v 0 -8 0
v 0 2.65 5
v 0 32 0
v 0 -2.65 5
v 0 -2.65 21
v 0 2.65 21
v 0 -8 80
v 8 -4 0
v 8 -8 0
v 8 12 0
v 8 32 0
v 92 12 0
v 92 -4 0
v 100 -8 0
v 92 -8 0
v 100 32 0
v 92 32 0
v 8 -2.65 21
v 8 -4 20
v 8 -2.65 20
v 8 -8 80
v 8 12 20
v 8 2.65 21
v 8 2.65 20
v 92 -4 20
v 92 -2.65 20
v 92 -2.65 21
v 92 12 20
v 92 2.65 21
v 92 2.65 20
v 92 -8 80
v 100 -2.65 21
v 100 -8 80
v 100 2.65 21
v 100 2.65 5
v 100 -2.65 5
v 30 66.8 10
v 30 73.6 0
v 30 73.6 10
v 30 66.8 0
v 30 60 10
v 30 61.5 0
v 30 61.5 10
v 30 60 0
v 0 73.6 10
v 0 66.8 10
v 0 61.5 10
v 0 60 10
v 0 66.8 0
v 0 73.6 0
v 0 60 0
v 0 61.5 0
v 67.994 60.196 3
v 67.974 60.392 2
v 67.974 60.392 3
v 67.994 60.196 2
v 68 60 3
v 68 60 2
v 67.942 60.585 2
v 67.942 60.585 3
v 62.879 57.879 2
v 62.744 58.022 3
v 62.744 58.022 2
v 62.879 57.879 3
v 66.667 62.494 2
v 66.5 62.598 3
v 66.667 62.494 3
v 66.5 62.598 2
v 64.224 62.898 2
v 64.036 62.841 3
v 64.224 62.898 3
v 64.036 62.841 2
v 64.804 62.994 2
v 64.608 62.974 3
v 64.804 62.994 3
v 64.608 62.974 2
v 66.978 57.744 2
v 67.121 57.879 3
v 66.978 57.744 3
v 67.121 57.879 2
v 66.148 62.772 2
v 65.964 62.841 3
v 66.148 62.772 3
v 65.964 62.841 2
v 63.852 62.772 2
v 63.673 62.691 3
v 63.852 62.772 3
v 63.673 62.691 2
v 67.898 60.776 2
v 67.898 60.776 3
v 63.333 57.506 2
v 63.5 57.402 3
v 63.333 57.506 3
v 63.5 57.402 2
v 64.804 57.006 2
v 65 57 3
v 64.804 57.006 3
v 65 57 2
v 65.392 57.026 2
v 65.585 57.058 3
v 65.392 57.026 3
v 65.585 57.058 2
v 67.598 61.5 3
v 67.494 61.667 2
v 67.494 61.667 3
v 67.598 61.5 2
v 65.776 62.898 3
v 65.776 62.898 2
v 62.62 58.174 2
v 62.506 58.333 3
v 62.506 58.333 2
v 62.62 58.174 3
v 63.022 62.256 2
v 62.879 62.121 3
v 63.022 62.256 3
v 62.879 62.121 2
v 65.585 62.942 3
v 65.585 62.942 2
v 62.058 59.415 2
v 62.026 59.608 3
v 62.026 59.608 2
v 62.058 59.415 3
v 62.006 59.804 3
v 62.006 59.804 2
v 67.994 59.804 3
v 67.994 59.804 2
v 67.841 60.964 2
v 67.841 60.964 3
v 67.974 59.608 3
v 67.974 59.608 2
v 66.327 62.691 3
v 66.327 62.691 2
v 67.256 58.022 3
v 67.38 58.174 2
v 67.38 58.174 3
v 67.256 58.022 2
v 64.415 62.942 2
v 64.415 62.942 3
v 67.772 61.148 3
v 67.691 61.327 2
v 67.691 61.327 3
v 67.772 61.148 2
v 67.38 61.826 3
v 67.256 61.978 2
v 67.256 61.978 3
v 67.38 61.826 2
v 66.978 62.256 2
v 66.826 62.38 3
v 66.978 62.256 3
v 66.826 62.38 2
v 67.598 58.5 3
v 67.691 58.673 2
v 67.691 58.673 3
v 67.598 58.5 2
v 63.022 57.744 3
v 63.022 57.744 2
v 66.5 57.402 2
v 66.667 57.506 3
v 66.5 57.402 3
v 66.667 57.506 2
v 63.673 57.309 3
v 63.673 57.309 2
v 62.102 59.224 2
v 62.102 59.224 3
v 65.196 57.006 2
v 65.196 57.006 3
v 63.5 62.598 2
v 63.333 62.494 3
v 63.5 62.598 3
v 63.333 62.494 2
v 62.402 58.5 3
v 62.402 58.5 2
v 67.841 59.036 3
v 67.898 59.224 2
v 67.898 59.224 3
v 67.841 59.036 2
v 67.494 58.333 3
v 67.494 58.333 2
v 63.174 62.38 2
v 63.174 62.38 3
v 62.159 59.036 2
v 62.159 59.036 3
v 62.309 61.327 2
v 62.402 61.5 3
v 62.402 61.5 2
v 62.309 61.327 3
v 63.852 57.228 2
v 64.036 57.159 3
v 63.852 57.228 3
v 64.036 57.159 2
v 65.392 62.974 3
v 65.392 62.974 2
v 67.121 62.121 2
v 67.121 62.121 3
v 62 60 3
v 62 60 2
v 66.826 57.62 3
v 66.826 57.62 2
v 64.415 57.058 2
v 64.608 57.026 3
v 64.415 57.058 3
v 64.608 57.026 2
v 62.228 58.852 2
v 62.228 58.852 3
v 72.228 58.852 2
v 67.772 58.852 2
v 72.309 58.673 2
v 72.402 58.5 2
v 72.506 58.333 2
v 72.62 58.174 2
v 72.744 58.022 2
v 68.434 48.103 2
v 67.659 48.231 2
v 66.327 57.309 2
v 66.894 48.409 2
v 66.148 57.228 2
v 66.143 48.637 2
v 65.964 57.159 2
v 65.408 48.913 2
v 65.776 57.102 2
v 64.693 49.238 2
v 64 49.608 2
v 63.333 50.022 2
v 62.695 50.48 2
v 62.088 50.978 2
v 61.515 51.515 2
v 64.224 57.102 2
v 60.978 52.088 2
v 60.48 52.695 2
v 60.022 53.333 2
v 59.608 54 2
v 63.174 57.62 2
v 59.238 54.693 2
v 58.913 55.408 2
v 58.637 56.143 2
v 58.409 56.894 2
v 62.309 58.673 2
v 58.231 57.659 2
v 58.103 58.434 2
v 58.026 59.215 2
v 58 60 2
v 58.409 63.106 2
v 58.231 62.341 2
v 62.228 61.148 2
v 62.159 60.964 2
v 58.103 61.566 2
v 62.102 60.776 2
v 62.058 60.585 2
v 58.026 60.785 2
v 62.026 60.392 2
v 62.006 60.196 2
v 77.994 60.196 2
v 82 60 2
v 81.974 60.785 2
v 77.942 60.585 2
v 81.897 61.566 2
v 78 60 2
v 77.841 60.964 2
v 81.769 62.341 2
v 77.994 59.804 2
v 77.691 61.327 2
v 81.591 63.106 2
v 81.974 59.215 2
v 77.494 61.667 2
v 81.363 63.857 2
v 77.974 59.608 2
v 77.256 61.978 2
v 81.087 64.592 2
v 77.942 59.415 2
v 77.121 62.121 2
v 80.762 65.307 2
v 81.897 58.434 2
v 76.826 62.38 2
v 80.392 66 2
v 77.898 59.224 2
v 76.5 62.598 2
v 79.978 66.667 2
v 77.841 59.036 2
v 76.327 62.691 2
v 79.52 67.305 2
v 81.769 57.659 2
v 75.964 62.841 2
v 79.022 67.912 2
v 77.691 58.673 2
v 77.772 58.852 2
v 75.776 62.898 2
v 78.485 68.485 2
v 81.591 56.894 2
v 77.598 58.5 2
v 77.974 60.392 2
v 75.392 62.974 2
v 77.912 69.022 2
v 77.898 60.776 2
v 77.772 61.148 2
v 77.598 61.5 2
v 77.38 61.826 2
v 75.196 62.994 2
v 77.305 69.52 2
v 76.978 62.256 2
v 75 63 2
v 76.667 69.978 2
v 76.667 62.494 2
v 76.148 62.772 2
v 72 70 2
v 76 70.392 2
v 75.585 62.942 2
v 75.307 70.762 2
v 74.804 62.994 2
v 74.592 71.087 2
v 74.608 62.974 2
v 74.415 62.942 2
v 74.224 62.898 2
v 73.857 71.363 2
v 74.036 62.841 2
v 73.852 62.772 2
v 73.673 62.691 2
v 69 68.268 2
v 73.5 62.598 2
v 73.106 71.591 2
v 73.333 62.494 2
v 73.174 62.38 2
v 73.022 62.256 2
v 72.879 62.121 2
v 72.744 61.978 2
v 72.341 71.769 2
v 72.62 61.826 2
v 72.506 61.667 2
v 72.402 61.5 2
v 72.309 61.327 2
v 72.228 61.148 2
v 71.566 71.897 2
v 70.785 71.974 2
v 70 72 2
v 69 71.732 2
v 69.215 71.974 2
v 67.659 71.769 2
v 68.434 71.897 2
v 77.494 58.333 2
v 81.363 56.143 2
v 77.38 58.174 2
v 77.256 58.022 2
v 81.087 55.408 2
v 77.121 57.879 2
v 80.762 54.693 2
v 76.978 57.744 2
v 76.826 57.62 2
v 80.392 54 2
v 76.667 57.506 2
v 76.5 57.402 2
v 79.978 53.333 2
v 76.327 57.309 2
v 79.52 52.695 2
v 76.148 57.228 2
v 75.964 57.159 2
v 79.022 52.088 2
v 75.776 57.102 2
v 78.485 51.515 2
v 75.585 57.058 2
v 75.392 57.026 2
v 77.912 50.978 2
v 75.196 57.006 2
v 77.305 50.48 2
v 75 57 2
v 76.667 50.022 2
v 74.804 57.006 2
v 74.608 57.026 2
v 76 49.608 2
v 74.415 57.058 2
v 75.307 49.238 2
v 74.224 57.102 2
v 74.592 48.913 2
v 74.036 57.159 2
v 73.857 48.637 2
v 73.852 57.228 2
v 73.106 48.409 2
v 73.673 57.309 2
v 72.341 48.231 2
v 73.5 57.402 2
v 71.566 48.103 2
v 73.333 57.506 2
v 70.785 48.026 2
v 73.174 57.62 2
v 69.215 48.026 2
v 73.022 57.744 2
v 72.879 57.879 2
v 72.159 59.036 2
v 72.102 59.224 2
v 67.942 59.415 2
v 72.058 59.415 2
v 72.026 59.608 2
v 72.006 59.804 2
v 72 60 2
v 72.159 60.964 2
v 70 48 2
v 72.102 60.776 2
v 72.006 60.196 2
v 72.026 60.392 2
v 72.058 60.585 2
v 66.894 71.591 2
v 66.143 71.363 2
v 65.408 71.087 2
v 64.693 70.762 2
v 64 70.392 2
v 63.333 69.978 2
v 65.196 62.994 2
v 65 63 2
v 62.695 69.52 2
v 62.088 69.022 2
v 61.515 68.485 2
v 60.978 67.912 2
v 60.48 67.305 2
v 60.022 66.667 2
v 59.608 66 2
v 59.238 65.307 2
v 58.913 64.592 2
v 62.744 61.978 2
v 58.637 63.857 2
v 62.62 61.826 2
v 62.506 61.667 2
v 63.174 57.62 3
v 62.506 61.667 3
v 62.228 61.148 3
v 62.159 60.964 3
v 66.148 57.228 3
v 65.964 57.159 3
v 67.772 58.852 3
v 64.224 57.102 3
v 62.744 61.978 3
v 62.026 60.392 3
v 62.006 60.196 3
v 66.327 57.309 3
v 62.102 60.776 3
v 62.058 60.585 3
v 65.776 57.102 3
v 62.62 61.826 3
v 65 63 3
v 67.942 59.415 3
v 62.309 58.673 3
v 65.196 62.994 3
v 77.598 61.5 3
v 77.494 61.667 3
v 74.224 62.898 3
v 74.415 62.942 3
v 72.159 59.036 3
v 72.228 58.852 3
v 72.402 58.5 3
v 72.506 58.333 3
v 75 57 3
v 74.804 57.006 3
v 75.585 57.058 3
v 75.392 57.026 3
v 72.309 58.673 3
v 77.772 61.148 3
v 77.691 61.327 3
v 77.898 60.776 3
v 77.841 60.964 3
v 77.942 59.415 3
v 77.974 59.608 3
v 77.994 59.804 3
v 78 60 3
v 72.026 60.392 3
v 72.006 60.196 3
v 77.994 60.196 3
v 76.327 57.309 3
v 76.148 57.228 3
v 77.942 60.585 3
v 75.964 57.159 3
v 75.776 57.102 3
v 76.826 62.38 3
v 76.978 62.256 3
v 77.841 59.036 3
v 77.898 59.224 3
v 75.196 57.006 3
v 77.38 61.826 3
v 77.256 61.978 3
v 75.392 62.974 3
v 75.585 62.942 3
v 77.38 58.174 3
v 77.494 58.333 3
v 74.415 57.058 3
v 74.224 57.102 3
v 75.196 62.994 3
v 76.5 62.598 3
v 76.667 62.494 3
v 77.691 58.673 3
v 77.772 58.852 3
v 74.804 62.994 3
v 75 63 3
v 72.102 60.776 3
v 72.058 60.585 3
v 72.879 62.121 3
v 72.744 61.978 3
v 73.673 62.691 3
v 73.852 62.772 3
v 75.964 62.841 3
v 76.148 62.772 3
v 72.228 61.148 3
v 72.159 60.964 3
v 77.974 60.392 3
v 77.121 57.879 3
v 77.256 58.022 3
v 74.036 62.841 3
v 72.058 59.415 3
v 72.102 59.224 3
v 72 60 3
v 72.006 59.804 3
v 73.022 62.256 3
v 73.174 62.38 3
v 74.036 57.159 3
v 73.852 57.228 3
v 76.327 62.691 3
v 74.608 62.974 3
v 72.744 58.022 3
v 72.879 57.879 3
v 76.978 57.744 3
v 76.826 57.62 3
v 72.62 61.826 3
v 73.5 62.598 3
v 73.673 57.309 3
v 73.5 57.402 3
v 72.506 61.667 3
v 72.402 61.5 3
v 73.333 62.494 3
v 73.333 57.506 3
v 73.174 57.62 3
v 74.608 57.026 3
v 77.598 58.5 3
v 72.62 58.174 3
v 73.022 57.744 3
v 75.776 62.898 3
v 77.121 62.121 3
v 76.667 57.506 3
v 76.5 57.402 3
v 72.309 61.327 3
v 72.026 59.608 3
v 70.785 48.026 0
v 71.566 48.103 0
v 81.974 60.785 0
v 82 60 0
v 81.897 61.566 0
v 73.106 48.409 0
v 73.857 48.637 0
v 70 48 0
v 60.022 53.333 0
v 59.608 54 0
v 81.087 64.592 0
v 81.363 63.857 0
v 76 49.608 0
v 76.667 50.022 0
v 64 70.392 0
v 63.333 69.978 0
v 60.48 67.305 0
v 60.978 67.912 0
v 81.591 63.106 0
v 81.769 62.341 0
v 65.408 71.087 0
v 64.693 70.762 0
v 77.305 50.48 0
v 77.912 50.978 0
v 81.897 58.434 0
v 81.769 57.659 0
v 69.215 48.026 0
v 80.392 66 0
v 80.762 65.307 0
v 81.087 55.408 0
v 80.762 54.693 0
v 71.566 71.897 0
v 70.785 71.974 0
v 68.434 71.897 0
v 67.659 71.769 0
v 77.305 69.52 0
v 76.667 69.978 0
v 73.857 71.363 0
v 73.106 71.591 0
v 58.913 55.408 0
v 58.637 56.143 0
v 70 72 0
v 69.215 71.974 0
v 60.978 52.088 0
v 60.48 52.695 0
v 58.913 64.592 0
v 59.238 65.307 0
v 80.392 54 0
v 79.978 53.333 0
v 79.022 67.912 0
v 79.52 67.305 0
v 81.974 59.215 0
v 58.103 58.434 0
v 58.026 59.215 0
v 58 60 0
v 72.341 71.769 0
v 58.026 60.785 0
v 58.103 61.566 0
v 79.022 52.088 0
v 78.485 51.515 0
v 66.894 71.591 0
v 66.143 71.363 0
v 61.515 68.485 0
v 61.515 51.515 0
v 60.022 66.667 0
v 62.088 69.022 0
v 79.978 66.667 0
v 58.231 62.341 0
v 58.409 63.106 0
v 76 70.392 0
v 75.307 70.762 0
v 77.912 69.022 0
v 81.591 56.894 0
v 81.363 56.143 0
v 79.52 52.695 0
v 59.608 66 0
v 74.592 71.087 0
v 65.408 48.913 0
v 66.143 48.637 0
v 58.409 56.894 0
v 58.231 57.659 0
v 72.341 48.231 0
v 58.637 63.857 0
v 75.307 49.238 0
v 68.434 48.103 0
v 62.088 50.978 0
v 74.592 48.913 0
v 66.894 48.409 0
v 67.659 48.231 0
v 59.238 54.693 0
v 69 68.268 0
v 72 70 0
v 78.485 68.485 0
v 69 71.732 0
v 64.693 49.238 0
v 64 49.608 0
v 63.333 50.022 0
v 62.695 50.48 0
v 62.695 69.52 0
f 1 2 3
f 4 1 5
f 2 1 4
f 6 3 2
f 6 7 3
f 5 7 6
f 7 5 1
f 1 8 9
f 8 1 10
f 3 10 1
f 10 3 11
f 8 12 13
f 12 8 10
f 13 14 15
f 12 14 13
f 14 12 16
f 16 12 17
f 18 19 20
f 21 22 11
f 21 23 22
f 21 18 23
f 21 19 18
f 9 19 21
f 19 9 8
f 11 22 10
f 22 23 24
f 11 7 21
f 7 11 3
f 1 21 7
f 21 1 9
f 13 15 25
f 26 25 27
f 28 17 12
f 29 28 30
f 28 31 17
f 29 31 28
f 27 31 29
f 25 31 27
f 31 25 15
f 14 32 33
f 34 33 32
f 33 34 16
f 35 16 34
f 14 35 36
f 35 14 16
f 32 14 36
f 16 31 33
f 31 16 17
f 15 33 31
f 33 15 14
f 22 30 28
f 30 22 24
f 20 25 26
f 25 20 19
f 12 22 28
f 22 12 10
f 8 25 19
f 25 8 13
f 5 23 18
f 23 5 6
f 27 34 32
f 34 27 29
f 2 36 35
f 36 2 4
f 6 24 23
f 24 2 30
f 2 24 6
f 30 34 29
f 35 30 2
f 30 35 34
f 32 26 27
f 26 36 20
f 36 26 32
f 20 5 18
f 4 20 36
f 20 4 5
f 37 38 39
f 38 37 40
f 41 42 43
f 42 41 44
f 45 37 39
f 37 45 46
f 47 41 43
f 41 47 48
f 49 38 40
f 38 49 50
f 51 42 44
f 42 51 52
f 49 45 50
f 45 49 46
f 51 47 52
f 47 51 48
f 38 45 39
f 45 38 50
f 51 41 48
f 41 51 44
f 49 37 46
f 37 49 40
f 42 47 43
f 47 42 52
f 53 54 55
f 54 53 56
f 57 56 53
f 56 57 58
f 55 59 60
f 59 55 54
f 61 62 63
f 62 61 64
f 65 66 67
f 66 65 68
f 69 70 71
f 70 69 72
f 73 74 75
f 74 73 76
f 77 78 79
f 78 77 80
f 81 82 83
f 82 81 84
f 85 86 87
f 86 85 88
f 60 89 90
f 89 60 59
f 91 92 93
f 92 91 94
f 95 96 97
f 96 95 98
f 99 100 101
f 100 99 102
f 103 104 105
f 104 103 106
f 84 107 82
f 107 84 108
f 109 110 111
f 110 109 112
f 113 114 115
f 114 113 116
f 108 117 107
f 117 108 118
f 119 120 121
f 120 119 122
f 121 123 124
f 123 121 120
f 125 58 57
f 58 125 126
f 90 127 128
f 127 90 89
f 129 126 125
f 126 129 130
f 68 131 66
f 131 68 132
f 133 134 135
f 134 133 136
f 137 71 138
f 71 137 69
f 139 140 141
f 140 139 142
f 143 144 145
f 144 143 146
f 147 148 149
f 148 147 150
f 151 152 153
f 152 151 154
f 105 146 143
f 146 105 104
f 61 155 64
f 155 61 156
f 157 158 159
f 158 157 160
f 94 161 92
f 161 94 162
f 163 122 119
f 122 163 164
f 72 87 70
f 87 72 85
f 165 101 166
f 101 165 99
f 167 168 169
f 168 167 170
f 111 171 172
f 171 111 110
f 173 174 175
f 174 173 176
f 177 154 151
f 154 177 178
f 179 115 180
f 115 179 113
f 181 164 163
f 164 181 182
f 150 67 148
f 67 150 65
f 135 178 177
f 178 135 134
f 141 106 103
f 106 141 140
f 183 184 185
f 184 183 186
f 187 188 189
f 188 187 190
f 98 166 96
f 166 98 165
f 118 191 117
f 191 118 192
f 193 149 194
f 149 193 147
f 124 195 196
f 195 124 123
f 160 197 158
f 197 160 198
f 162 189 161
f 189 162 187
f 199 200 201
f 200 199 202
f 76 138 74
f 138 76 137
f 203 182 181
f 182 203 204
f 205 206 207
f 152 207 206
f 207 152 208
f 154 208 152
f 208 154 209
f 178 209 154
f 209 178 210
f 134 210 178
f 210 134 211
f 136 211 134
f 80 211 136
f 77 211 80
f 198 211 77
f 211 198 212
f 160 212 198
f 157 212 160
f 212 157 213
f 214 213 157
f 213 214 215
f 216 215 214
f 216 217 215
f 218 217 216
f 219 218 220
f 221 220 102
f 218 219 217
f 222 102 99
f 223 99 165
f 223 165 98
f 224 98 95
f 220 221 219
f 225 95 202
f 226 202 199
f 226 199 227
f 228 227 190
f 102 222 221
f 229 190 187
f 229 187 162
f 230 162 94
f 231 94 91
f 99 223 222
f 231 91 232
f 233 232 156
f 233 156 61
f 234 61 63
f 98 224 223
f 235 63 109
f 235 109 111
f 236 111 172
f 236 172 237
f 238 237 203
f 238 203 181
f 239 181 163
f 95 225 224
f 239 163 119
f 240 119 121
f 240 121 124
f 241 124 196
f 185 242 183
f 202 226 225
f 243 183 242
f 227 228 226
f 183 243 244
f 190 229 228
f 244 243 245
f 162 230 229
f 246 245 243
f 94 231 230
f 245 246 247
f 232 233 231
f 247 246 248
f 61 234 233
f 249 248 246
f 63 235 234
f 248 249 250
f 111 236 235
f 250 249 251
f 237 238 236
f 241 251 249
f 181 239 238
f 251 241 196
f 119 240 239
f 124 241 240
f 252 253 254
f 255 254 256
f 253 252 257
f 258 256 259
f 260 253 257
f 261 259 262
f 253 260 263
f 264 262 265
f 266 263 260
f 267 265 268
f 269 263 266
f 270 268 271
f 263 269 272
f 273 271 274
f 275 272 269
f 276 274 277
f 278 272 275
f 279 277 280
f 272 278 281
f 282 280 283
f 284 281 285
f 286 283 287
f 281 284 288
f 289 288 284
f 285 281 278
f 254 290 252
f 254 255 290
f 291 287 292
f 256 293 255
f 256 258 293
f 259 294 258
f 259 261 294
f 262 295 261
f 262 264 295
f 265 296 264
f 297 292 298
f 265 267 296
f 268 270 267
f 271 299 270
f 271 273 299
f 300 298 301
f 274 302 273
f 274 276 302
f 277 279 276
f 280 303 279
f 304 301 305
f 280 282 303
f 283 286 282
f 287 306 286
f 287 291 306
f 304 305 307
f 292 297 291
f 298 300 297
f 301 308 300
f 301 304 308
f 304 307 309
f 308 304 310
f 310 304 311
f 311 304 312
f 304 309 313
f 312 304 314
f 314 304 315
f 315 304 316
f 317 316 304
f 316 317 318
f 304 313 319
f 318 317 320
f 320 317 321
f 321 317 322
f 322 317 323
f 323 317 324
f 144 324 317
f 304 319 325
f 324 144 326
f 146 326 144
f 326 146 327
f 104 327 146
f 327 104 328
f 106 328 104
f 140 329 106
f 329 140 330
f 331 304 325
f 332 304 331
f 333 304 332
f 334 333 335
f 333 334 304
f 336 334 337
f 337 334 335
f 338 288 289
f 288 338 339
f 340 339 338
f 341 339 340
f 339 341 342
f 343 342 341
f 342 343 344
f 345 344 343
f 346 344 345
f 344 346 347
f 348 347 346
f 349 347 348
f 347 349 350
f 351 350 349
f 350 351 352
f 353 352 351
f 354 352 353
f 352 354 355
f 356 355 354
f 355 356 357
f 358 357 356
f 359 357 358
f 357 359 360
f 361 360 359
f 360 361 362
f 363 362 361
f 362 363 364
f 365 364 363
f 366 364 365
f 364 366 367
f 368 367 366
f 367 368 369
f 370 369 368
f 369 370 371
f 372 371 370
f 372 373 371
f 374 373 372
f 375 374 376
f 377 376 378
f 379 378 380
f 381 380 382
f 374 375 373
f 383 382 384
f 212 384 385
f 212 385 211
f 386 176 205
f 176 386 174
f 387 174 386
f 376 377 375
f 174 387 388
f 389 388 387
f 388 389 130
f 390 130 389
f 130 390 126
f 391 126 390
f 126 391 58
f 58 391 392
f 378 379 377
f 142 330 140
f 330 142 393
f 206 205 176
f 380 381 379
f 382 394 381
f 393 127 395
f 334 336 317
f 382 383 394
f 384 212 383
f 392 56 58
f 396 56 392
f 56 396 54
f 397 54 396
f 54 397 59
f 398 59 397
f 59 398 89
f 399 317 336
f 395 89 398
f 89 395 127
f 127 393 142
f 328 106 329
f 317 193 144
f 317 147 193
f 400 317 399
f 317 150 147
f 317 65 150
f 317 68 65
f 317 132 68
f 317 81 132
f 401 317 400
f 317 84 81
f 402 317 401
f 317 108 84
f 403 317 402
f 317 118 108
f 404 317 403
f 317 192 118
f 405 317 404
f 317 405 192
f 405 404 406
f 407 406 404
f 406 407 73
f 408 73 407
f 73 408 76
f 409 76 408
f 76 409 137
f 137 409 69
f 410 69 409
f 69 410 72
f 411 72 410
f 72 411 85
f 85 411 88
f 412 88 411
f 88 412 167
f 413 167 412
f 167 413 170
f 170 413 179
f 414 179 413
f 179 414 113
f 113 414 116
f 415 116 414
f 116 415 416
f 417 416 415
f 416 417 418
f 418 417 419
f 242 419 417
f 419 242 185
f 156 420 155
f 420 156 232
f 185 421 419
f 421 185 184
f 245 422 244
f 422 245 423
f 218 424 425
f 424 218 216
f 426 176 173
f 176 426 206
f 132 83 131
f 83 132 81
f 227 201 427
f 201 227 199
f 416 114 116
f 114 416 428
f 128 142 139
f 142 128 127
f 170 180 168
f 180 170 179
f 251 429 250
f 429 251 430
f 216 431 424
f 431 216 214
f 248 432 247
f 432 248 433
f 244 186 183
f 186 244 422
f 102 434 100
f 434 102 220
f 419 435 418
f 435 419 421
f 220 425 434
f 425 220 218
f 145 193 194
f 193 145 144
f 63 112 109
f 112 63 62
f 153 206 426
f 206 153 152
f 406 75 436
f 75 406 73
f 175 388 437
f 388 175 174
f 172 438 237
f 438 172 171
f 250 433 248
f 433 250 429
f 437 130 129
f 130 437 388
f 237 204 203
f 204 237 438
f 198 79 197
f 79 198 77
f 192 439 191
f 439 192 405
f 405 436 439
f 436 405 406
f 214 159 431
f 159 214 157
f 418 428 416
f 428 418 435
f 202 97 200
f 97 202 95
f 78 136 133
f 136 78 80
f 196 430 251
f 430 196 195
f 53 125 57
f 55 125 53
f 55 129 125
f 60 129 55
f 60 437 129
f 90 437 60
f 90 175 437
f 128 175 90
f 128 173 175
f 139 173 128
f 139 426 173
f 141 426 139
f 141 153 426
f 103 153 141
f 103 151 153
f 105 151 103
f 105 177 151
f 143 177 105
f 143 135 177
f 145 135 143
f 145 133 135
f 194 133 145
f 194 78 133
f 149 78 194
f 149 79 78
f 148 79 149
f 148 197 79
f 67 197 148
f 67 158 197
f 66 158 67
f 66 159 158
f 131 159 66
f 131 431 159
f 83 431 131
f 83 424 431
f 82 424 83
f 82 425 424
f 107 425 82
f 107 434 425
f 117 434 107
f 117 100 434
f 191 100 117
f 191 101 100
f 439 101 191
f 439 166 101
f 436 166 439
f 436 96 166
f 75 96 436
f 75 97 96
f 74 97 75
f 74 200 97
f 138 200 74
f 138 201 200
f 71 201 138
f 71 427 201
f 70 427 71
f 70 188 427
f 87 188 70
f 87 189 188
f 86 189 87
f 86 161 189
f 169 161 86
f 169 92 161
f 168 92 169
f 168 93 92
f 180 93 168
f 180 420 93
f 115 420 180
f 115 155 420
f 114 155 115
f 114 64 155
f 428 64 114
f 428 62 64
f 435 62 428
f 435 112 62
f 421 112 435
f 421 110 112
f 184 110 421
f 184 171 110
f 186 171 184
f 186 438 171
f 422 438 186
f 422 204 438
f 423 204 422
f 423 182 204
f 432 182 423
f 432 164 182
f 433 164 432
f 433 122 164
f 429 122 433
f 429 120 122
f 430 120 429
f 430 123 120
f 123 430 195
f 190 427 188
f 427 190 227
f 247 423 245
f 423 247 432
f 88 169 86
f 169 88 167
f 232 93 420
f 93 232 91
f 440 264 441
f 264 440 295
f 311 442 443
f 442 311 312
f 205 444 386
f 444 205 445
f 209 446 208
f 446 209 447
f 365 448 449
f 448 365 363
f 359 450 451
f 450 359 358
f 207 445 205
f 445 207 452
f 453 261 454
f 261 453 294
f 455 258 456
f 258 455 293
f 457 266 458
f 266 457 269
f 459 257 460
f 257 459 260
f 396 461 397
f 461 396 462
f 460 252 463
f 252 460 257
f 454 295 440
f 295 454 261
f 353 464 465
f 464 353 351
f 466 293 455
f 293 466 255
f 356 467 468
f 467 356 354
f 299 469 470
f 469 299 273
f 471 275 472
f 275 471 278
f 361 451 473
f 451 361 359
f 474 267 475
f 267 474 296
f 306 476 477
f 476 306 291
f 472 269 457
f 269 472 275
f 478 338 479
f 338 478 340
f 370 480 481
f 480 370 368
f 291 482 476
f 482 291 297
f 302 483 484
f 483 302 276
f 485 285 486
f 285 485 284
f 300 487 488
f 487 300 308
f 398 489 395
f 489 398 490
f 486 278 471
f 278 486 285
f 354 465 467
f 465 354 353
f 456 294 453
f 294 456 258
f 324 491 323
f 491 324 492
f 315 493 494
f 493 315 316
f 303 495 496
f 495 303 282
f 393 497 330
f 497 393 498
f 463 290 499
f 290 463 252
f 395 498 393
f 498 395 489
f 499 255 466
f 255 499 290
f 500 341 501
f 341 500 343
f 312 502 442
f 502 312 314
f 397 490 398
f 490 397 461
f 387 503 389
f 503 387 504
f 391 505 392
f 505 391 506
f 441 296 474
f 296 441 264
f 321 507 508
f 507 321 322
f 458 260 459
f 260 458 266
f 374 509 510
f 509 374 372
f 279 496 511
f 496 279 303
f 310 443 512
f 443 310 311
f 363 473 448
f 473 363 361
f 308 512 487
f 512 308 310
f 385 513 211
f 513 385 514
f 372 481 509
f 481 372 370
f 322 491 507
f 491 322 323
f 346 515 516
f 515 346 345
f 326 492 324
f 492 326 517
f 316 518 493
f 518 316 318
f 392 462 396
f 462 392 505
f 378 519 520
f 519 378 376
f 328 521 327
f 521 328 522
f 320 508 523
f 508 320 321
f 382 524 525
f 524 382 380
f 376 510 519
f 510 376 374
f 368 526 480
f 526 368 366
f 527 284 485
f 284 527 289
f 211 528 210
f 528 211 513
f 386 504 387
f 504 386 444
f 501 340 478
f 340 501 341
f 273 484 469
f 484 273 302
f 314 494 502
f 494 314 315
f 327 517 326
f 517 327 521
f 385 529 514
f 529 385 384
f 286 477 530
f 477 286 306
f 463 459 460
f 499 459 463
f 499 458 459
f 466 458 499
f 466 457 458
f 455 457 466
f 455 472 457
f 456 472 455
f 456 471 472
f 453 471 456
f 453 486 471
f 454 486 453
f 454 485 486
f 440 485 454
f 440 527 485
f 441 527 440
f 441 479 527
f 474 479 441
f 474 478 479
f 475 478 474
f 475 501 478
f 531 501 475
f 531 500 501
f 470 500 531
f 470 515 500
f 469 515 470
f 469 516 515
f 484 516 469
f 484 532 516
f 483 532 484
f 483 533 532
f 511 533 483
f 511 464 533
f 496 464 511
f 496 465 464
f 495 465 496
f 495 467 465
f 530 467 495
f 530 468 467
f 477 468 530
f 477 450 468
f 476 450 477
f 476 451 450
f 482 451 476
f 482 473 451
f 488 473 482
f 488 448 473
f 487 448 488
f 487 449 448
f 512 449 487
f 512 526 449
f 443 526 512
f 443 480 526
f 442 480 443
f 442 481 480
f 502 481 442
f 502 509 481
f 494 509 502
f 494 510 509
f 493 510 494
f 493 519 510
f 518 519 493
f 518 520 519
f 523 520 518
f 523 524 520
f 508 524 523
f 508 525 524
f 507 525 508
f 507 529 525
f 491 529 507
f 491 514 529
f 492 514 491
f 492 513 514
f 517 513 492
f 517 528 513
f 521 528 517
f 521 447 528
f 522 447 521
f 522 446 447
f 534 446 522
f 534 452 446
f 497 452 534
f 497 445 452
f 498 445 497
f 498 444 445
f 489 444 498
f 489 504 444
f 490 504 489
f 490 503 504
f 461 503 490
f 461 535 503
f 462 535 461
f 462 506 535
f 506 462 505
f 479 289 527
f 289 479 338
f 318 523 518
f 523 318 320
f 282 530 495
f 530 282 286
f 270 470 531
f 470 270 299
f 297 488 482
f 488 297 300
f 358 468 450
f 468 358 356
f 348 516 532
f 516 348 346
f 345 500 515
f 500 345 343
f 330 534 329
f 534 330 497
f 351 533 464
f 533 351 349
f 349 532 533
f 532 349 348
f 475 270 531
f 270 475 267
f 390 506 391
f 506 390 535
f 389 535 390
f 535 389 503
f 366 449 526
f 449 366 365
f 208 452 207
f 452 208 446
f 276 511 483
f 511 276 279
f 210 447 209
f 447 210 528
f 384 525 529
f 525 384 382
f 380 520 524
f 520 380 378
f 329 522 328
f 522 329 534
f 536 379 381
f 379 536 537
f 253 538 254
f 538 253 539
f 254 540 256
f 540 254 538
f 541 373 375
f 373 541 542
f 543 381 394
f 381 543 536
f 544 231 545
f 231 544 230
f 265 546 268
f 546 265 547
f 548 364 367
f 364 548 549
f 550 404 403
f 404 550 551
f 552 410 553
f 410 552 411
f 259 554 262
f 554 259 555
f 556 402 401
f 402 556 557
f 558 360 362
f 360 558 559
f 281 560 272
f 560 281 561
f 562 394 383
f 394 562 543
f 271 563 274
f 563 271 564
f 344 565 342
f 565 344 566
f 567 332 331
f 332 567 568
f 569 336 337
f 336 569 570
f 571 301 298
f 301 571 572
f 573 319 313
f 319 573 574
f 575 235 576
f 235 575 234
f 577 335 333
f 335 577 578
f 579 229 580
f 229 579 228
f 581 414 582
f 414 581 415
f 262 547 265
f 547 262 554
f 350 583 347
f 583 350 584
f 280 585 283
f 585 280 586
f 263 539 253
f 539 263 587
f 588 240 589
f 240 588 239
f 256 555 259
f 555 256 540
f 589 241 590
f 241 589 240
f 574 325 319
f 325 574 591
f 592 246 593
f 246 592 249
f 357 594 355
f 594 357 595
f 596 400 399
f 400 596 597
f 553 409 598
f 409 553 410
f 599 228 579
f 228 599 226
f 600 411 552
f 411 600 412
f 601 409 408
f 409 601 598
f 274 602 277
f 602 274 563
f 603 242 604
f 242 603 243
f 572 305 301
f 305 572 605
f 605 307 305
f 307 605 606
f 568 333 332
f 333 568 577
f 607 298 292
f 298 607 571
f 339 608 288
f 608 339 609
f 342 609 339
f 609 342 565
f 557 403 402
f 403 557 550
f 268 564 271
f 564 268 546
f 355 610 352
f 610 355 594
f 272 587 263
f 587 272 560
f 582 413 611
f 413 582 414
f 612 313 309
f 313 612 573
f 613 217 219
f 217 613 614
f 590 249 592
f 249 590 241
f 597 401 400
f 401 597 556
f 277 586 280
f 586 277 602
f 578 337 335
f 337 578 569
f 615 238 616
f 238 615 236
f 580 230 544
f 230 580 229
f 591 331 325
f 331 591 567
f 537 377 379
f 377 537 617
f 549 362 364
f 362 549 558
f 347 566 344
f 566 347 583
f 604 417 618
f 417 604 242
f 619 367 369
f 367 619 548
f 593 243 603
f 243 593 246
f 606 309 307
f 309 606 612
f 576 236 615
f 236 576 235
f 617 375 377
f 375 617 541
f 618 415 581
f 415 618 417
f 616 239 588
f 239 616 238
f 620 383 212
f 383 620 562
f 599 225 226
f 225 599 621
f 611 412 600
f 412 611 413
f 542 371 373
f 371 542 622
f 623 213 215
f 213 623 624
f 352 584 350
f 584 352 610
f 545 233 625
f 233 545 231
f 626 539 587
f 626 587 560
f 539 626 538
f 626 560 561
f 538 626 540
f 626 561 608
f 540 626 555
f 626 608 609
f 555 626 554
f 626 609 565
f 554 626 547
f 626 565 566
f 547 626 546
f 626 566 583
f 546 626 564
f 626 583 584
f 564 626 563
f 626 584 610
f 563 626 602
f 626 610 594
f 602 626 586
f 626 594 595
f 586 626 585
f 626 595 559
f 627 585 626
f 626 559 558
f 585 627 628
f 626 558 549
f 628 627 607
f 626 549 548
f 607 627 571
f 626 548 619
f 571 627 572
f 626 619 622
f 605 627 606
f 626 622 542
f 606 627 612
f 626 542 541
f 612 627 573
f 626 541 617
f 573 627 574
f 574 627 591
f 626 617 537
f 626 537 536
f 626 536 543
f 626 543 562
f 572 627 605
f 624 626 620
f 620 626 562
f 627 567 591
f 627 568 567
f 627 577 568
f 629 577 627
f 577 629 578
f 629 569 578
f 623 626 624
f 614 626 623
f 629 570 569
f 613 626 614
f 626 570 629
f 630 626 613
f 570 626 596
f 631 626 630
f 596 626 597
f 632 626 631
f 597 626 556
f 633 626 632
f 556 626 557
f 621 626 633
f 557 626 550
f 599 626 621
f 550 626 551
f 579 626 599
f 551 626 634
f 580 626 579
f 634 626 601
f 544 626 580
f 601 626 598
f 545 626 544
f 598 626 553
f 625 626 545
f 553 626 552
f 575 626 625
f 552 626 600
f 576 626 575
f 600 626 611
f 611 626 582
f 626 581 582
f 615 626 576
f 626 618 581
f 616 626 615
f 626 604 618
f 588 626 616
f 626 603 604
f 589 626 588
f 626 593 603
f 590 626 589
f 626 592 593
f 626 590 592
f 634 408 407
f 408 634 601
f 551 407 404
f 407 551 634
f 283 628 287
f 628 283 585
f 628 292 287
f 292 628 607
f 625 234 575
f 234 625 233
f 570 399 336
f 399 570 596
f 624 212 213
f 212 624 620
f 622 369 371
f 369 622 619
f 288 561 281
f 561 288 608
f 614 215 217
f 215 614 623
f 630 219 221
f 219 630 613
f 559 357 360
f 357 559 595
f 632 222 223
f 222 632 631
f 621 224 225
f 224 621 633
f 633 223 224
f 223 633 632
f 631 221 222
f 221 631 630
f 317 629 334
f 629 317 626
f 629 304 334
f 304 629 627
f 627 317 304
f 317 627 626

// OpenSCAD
// file: ../lib/dovetail.scad
// lib/dovetail.scad
// Shared joinery modules: dovetail tenon/mortise, M3 insert boss, rounded box.
// Depends on values in params.scad (include it in the calling file).

// A dovetail tenon: a flared prism that grows wider toward its tip so it locks
// against a matching mortise when slid in along +y.
//   len   : protrusion length (along +y)
//   base_w: width at the root (x, near the part)
//   tip_w : width at the tip (x, wider -> self locking)
//   h     : height (z)
// Literal defaults keep this library self-contained under `use <>` (which does
// not import the caller's params). Callers pass explicit sizes where needed.
module dovetail_tenon(len = 8, base_w = 8, tip_w = 12, h = 10) {
    linear_extrude(height = h)
        polygon(points = [
            [-base_w/2, 0],
            [ base_w/2, 0],
            [ tip_w/2,  len],
            [-tip_w/2,  len],
        ]);
}

// Matching mortise volume (subtract this). Enlarged by tol_dovetail per side.
module dovetail_mortise(len = 8, base_w = 8, tip_w = 12, h = 10, clr = 0.15) {
    // extend slightly beyond both faces so the cut is clean
    translate([0, -0.01, -0.01])
        linear_extrude(height = h + 0.02)
            polygon(points = [
                [-(base_w/2 + clr), 0],
                [ (base_w/2 + clr), 0],
                [ (tip_w/2 + clr),  len + 0.02],
                [-(tip_w/2 + clr),  len + 0.02],
            ]);
}

// Cylindrical boss with a blind hole for a heat-set insert.
//   boss_d : outer diameter of the boss
//   boss_h : height
//   hole_d : insert press-hole diameter (params: m3_insert)
//   hole_depth : blind hole depth (0 = through)
module insert_boss(boss_d = 8, boss_h = 8, hole_d = 4.0, hole_depth = 0) {
    difference() {
        cylinder(d = boss_d, h = boss_h);
        translate([0, 0, hole_depth == 0 ? -0.01 : boss_h - hole_depth])
            cylinder(d = hole_d, h = hole_depth == 0 ? boss_h + 0.02 : hole_depth + 0.01);
    }
}

// Rounded rectangular box shell (open top) used by gondola / recesses.
module rounded_box(x, y, z, r = 2) {
    hull() {
        for (sx = [-1, 1], sy = [-1, 1])
            translate([sx * (x/2 - r), sy * (y/2 - r), 0])
                cylinder(r = r, h = z);
    }
}

// A simple rectangular slot cutter (for tabs), centered on x, open along z.
module slot(w, t, d) {
    translate([-w/2, -t/2, -0.01])
        cube([w, t, d + 0.02]);
}
// main file
// booth/stand_clips.scad
// Wall-panel stand (100 x 80, t8) + panel connecting clip + position marker,
// laid out for a single print.
//   stand  : a channel foot the panel bottom edge drops into, braced by two
//            triangular end gussets (support-free: slot opens upward).
//   clip   : H-section clip that joins two panel edges side by side.
//   marker : Ø24 floor disc marking Stack-chan's photo spot (raised footprint).

include <../params.scad>;
use <../lib/dovetail.scad>;

rail_h   = 20;               // channel rail height
gusset_d = 40;               // gusset depth (Y)

module stand() {
    slot_w = wall_t + tol;   // panel thickness slot
    difference() {
        union() {
            // channel rail (panel drops into the top slot)
            translate([0, (stand_t - 0)/2, 0])
                translate([0, -8, 0])
                    cube([stand_x, 16, rail_h]);
            // two triangular end gussets in Y-Z, bracing the panel back
            for (ex = [0, stand_x - stand_t])
                translate([ex, -8, 0])
                    rotate([90, 0, 90])
                        linear_extrude(stand_t)
                            polygon([[0, 0], [gusset_d, 0], [0, stand_y]]);
        }
        // upward-open panel slot along the full rail length
        translate([-1, -slot_w/2 - 8 + 8, rail_h - 15])
            cube([stand_x + 2, slot_w, 16]);
    }
}

module clip() {
    // H-section: two channels (each wall_t + tol) back to back
    ch = wall_t + tol;
    difference() {
        cube([clip_len, 2 * ch + 3, 10]);
        translate([-1, 1.5, -1]) cube([clip_len + 2, ch, 7]);          // upper channel
        translate([-1, 1.5, 4]) cube([clip_len + 2, ch, 7]);           // lower channel offset
    }
}

module marker() {
    difference() {
        union() {
            cylinder(d = marker_d, h = 2);
            // raised footprint outline (two small pads = where Stack-chan stands)
            for (sx = [-1, 1])
                translate([sx * 5, 0, 2]) cylinder(d = 6, h = 1);
        }
        // arrow notch pointing to the camera
        translate([0, marker_d/2 - 2, -1]) cylinder(d = 4, h = 5, $fn = 3);
    }
}

stand();
translate([0, 60, 0]) clip();
translate([70, 60, 0]) marker();
